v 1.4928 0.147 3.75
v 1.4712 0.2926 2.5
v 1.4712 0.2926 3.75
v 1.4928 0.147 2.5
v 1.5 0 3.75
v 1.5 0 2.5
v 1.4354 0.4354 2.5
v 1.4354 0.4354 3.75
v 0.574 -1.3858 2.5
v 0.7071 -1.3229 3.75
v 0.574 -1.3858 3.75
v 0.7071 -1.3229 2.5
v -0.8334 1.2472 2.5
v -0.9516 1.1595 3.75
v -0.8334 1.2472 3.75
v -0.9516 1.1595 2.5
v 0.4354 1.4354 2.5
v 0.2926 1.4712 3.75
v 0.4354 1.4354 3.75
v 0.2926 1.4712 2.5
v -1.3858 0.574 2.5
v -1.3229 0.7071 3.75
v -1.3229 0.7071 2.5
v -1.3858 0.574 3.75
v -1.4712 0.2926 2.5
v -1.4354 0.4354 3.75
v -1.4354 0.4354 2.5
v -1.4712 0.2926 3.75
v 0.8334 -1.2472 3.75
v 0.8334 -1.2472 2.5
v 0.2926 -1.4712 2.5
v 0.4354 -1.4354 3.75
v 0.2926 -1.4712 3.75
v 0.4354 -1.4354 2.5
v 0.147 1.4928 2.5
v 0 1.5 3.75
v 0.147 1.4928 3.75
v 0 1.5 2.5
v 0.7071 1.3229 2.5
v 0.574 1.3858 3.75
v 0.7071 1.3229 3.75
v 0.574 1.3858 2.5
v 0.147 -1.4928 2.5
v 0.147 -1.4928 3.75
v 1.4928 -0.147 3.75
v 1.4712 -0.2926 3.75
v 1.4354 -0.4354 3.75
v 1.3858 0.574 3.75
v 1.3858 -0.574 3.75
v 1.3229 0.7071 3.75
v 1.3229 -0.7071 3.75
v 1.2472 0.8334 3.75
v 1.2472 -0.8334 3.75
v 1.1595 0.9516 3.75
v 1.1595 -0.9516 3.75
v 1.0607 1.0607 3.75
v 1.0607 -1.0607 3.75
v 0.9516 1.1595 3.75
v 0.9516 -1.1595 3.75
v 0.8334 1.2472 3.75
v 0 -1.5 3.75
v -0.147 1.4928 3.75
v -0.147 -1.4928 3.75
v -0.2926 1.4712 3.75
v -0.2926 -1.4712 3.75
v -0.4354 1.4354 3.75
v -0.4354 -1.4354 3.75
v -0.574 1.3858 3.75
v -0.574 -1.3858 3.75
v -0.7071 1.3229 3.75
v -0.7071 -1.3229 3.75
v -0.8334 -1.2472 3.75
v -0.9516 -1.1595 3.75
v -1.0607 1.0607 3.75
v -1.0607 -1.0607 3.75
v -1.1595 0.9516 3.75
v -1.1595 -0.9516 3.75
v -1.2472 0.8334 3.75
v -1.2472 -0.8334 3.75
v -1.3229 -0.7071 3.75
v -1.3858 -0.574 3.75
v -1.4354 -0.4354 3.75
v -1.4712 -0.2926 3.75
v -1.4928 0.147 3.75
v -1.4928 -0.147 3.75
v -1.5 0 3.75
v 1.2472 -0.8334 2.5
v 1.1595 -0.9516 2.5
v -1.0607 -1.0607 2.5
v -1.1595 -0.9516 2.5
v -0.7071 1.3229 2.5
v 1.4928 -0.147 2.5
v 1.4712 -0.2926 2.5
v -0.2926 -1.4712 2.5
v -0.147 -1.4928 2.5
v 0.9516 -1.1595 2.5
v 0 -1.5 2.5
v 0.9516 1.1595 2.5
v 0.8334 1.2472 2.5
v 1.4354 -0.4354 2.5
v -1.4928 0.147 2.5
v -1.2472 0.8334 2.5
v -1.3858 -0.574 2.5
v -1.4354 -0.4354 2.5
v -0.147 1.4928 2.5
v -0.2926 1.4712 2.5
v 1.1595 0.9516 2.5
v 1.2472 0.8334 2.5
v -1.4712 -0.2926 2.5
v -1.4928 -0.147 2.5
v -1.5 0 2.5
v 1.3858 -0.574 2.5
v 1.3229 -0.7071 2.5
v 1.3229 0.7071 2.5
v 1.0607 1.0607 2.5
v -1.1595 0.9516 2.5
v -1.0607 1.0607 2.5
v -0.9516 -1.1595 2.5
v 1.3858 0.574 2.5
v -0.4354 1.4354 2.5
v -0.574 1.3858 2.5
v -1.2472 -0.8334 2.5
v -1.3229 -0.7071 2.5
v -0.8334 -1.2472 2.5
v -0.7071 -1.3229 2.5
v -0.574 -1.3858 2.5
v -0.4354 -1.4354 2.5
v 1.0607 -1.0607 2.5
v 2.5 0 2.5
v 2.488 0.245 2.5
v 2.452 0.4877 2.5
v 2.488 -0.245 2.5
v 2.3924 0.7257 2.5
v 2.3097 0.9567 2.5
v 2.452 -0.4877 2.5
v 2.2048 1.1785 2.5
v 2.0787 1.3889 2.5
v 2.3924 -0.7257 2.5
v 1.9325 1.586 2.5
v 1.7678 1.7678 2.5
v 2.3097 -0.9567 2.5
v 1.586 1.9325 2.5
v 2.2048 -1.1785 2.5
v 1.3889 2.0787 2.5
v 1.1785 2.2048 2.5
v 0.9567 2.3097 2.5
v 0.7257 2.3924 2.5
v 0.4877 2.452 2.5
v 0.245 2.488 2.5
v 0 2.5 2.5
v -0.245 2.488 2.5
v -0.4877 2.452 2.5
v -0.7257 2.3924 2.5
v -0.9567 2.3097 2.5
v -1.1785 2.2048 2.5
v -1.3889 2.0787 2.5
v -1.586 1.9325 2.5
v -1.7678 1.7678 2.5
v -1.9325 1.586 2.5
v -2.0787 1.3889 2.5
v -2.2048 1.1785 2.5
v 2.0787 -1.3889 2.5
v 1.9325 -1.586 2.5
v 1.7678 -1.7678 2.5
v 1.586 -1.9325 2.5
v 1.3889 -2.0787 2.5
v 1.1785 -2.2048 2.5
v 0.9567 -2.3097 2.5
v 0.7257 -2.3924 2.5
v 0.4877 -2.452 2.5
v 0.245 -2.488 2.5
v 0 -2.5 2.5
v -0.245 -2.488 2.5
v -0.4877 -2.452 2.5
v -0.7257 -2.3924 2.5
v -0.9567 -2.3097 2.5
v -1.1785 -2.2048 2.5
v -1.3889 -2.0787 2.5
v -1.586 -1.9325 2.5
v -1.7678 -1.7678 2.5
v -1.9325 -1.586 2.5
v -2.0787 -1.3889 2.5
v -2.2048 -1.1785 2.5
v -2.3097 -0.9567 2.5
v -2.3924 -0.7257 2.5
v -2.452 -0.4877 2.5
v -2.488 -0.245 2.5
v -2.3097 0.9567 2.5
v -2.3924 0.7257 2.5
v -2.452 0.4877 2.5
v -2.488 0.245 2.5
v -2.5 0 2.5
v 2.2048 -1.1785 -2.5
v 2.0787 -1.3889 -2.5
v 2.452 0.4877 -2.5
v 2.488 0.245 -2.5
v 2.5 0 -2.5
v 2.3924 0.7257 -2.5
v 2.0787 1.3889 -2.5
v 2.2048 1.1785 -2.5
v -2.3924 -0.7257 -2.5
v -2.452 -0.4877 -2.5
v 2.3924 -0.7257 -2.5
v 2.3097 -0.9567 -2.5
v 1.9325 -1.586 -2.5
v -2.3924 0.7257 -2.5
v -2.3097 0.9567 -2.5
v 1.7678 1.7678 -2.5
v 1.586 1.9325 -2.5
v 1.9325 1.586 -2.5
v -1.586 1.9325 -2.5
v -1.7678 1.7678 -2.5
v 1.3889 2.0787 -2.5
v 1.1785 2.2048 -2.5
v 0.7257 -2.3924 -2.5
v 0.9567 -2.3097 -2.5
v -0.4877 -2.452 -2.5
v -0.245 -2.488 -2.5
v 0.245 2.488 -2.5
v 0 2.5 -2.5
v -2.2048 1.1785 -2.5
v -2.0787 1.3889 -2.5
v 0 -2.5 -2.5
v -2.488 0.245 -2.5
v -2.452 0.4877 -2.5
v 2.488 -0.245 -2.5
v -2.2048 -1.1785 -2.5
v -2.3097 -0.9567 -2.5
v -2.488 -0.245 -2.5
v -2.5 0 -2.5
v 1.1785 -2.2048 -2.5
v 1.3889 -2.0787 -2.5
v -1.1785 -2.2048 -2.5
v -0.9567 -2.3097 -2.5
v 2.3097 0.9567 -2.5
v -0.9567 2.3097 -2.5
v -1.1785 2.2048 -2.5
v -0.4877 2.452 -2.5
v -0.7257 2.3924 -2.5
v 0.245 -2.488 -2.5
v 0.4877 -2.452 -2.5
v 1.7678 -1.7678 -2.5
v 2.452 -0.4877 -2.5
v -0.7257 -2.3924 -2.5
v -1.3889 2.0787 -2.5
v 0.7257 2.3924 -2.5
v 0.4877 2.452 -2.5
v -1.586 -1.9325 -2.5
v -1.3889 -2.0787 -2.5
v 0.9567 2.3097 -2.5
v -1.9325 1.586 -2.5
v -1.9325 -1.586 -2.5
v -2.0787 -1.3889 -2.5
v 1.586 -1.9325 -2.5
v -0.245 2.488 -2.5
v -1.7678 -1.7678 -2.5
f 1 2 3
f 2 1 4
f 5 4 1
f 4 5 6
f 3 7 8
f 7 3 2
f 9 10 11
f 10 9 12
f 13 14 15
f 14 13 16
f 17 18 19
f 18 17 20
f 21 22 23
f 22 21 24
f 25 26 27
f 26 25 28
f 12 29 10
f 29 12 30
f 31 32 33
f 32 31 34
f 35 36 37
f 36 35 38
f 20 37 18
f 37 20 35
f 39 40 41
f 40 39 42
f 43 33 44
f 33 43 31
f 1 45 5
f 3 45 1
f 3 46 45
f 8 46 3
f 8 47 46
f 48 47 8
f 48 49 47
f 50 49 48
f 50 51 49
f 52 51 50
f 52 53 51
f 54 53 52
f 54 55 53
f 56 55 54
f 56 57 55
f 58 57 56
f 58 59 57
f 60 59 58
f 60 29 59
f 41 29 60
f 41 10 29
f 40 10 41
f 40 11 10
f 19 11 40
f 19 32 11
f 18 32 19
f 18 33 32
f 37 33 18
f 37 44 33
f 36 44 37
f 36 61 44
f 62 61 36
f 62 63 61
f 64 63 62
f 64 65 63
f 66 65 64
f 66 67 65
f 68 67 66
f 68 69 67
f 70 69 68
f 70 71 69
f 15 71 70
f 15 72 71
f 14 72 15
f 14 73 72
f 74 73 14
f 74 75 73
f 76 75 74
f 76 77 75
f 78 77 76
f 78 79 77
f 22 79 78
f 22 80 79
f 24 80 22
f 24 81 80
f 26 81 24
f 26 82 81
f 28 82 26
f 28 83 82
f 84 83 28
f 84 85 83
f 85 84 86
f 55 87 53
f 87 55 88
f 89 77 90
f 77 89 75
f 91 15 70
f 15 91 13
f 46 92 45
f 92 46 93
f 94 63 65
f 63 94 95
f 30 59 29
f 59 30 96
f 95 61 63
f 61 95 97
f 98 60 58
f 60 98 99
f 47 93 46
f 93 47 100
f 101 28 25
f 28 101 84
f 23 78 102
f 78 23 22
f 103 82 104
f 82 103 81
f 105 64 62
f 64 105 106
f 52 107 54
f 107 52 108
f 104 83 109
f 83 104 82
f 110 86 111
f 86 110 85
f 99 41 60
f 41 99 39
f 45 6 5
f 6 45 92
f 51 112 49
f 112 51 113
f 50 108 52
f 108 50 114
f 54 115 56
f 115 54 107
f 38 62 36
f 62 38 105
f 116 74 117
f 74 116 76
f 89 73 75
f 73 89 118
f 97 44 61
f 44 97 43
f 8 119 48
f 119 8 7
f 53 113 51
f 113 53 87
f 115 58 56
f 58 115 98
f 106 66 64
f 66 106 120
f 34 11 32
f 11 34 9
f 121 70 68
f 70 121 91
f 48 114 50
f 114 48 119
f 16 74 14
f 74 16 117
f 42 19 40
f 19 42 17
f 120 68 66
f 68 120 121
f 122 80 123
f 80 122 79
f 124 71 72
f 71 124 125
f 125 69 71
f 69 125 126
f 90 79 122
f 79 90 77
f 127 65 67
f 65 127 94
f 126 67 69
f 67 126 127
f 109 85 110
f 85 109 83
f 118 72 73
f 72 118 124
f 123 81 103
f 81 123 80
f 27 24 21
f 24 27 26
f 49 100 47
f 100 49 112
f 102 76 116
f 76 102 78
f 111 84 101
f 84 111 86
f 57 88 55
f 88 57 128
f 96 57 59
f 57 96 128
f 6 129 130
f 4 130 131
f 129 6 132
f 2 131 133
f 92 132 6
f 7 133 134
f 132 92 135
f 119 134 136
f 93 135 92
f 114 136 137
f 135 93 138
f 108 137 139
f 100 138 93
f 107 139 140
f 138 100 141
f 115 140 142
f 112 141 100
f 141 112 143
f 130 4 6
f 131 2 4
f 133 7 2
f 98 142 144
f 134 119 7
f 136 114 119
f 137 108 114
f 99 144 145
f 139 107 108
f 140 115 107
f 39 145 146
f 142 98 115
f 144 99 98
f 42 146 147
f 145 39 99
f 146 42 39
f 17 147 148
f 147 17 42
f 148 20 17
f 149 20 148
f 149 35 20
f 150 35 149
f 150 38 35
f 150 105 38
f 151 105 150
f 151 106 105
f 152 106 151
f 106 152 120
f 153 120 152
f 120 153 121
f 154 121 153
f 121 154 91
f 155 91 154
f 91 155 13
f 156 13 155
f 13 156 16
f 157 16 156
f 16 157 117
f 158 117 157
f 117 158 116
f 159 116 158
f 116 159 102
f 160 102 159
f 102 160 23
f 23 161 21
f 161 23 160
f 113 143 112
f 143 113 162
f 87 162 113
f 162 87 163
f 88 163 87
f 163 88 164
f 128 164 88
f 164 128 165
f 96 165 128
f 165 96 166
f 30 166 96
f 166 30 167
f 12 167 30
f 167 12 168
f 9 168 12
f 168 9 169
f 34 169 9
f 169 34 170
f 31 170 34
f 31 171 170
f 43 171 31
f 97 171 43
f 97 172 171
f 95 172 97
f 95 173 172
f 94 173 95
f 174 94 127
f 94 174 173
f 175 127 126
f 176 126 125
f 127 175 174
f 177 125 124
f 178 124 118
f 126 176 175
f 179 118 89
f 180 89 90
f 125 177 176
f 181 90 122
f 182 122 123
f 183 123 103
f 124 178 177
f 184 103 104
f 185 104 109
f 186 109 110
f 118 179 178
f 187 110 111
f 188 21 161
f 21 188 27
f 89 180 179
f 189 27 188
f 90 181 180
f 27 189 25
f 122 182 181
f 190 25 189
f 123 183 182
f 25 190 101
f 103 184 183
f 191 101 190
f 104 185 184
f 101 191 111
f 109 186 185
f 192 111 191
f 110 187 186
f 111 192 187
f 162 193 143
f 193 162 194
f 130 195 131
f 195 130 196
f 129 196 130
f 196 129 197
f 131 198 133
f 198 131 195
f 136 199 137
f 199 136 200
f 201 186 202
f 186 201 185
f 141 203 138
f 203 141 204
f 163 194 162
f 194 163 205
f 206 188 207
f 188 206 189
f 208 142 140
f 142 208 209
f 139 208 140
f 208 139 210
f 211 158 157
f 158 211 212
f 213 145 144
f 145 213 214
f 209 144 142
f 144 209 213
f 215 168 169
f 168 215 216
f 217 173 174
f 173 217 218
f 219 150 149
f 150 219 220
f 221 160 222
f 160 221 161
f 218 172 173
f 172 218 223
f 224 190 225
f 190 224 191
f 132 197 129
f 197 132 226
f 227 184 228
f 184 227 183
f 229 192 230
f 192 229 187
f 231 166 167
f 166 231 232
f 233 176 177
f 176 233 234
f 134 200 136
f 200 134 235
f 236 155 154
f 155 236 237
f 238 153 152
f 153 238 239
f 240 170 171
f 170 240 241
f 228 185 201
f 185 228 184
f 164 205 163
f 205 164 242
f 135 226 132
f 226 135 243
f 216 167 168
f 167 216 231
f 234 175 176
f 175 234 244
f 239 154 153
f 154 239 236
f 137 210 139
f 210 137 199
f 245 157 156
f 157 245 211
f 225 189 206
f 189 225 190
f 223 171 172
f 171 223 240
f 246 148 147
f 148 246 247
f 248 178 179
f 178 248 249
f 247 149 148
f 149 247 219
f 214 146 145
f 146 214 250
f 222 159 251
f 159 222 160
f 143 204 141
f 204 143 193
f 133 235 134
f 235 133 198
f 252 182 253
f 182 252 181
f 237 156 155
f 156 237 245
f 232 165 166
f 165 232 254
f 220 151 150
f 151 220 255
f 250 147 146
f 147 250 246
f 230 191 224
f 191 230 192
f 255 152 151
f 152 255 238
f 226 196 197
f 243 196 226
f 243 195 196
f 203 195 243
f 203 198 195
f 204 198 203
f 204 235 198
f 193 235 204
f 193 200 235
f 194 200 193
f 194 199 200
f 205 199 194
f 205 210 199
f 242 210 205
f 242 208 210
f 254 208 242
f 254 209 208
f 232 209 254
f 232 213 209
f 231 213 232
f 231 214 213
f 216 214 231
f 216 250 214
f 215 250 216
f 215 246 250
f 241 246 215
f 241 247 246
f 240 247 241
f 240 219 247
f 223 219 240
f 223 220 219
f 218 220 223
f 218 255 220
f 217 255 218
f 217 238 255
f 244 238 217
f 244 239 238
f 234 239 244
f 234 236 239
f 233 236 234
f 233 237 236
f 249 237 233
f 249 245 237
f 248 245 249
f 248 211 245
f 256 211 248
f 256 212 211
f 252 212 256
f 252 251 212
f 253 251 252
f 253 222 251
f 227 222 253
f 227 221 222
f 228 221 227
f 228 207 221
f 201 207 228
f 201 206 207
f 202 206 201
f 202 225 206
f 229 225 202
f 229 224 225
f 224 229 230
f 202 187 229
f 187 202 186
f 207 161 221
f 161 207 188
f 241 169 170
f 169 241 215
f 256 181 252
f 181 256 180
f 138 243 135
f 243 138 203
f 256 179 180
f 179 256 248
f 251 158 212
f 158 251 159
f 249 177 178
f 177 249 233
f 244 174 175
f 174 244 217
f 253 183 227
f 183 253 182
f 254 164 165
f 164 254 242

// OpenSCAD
module grub_screw() {
    $fn = 64;
    // Main body of the grub screw
    cylinder(h = 5, d = 5, center = true);
    
    // Hex socket
    translate([0, 0, 2.5])
        difference() {
            cylinder(h = 2.5, d = 3, center = true);
            rotate([0, 0, 0])
                translate([0, 0, -1.25])
                cylinder(h = 2.5, d = 2.5, center = true);
        }
}

grub_screw();
